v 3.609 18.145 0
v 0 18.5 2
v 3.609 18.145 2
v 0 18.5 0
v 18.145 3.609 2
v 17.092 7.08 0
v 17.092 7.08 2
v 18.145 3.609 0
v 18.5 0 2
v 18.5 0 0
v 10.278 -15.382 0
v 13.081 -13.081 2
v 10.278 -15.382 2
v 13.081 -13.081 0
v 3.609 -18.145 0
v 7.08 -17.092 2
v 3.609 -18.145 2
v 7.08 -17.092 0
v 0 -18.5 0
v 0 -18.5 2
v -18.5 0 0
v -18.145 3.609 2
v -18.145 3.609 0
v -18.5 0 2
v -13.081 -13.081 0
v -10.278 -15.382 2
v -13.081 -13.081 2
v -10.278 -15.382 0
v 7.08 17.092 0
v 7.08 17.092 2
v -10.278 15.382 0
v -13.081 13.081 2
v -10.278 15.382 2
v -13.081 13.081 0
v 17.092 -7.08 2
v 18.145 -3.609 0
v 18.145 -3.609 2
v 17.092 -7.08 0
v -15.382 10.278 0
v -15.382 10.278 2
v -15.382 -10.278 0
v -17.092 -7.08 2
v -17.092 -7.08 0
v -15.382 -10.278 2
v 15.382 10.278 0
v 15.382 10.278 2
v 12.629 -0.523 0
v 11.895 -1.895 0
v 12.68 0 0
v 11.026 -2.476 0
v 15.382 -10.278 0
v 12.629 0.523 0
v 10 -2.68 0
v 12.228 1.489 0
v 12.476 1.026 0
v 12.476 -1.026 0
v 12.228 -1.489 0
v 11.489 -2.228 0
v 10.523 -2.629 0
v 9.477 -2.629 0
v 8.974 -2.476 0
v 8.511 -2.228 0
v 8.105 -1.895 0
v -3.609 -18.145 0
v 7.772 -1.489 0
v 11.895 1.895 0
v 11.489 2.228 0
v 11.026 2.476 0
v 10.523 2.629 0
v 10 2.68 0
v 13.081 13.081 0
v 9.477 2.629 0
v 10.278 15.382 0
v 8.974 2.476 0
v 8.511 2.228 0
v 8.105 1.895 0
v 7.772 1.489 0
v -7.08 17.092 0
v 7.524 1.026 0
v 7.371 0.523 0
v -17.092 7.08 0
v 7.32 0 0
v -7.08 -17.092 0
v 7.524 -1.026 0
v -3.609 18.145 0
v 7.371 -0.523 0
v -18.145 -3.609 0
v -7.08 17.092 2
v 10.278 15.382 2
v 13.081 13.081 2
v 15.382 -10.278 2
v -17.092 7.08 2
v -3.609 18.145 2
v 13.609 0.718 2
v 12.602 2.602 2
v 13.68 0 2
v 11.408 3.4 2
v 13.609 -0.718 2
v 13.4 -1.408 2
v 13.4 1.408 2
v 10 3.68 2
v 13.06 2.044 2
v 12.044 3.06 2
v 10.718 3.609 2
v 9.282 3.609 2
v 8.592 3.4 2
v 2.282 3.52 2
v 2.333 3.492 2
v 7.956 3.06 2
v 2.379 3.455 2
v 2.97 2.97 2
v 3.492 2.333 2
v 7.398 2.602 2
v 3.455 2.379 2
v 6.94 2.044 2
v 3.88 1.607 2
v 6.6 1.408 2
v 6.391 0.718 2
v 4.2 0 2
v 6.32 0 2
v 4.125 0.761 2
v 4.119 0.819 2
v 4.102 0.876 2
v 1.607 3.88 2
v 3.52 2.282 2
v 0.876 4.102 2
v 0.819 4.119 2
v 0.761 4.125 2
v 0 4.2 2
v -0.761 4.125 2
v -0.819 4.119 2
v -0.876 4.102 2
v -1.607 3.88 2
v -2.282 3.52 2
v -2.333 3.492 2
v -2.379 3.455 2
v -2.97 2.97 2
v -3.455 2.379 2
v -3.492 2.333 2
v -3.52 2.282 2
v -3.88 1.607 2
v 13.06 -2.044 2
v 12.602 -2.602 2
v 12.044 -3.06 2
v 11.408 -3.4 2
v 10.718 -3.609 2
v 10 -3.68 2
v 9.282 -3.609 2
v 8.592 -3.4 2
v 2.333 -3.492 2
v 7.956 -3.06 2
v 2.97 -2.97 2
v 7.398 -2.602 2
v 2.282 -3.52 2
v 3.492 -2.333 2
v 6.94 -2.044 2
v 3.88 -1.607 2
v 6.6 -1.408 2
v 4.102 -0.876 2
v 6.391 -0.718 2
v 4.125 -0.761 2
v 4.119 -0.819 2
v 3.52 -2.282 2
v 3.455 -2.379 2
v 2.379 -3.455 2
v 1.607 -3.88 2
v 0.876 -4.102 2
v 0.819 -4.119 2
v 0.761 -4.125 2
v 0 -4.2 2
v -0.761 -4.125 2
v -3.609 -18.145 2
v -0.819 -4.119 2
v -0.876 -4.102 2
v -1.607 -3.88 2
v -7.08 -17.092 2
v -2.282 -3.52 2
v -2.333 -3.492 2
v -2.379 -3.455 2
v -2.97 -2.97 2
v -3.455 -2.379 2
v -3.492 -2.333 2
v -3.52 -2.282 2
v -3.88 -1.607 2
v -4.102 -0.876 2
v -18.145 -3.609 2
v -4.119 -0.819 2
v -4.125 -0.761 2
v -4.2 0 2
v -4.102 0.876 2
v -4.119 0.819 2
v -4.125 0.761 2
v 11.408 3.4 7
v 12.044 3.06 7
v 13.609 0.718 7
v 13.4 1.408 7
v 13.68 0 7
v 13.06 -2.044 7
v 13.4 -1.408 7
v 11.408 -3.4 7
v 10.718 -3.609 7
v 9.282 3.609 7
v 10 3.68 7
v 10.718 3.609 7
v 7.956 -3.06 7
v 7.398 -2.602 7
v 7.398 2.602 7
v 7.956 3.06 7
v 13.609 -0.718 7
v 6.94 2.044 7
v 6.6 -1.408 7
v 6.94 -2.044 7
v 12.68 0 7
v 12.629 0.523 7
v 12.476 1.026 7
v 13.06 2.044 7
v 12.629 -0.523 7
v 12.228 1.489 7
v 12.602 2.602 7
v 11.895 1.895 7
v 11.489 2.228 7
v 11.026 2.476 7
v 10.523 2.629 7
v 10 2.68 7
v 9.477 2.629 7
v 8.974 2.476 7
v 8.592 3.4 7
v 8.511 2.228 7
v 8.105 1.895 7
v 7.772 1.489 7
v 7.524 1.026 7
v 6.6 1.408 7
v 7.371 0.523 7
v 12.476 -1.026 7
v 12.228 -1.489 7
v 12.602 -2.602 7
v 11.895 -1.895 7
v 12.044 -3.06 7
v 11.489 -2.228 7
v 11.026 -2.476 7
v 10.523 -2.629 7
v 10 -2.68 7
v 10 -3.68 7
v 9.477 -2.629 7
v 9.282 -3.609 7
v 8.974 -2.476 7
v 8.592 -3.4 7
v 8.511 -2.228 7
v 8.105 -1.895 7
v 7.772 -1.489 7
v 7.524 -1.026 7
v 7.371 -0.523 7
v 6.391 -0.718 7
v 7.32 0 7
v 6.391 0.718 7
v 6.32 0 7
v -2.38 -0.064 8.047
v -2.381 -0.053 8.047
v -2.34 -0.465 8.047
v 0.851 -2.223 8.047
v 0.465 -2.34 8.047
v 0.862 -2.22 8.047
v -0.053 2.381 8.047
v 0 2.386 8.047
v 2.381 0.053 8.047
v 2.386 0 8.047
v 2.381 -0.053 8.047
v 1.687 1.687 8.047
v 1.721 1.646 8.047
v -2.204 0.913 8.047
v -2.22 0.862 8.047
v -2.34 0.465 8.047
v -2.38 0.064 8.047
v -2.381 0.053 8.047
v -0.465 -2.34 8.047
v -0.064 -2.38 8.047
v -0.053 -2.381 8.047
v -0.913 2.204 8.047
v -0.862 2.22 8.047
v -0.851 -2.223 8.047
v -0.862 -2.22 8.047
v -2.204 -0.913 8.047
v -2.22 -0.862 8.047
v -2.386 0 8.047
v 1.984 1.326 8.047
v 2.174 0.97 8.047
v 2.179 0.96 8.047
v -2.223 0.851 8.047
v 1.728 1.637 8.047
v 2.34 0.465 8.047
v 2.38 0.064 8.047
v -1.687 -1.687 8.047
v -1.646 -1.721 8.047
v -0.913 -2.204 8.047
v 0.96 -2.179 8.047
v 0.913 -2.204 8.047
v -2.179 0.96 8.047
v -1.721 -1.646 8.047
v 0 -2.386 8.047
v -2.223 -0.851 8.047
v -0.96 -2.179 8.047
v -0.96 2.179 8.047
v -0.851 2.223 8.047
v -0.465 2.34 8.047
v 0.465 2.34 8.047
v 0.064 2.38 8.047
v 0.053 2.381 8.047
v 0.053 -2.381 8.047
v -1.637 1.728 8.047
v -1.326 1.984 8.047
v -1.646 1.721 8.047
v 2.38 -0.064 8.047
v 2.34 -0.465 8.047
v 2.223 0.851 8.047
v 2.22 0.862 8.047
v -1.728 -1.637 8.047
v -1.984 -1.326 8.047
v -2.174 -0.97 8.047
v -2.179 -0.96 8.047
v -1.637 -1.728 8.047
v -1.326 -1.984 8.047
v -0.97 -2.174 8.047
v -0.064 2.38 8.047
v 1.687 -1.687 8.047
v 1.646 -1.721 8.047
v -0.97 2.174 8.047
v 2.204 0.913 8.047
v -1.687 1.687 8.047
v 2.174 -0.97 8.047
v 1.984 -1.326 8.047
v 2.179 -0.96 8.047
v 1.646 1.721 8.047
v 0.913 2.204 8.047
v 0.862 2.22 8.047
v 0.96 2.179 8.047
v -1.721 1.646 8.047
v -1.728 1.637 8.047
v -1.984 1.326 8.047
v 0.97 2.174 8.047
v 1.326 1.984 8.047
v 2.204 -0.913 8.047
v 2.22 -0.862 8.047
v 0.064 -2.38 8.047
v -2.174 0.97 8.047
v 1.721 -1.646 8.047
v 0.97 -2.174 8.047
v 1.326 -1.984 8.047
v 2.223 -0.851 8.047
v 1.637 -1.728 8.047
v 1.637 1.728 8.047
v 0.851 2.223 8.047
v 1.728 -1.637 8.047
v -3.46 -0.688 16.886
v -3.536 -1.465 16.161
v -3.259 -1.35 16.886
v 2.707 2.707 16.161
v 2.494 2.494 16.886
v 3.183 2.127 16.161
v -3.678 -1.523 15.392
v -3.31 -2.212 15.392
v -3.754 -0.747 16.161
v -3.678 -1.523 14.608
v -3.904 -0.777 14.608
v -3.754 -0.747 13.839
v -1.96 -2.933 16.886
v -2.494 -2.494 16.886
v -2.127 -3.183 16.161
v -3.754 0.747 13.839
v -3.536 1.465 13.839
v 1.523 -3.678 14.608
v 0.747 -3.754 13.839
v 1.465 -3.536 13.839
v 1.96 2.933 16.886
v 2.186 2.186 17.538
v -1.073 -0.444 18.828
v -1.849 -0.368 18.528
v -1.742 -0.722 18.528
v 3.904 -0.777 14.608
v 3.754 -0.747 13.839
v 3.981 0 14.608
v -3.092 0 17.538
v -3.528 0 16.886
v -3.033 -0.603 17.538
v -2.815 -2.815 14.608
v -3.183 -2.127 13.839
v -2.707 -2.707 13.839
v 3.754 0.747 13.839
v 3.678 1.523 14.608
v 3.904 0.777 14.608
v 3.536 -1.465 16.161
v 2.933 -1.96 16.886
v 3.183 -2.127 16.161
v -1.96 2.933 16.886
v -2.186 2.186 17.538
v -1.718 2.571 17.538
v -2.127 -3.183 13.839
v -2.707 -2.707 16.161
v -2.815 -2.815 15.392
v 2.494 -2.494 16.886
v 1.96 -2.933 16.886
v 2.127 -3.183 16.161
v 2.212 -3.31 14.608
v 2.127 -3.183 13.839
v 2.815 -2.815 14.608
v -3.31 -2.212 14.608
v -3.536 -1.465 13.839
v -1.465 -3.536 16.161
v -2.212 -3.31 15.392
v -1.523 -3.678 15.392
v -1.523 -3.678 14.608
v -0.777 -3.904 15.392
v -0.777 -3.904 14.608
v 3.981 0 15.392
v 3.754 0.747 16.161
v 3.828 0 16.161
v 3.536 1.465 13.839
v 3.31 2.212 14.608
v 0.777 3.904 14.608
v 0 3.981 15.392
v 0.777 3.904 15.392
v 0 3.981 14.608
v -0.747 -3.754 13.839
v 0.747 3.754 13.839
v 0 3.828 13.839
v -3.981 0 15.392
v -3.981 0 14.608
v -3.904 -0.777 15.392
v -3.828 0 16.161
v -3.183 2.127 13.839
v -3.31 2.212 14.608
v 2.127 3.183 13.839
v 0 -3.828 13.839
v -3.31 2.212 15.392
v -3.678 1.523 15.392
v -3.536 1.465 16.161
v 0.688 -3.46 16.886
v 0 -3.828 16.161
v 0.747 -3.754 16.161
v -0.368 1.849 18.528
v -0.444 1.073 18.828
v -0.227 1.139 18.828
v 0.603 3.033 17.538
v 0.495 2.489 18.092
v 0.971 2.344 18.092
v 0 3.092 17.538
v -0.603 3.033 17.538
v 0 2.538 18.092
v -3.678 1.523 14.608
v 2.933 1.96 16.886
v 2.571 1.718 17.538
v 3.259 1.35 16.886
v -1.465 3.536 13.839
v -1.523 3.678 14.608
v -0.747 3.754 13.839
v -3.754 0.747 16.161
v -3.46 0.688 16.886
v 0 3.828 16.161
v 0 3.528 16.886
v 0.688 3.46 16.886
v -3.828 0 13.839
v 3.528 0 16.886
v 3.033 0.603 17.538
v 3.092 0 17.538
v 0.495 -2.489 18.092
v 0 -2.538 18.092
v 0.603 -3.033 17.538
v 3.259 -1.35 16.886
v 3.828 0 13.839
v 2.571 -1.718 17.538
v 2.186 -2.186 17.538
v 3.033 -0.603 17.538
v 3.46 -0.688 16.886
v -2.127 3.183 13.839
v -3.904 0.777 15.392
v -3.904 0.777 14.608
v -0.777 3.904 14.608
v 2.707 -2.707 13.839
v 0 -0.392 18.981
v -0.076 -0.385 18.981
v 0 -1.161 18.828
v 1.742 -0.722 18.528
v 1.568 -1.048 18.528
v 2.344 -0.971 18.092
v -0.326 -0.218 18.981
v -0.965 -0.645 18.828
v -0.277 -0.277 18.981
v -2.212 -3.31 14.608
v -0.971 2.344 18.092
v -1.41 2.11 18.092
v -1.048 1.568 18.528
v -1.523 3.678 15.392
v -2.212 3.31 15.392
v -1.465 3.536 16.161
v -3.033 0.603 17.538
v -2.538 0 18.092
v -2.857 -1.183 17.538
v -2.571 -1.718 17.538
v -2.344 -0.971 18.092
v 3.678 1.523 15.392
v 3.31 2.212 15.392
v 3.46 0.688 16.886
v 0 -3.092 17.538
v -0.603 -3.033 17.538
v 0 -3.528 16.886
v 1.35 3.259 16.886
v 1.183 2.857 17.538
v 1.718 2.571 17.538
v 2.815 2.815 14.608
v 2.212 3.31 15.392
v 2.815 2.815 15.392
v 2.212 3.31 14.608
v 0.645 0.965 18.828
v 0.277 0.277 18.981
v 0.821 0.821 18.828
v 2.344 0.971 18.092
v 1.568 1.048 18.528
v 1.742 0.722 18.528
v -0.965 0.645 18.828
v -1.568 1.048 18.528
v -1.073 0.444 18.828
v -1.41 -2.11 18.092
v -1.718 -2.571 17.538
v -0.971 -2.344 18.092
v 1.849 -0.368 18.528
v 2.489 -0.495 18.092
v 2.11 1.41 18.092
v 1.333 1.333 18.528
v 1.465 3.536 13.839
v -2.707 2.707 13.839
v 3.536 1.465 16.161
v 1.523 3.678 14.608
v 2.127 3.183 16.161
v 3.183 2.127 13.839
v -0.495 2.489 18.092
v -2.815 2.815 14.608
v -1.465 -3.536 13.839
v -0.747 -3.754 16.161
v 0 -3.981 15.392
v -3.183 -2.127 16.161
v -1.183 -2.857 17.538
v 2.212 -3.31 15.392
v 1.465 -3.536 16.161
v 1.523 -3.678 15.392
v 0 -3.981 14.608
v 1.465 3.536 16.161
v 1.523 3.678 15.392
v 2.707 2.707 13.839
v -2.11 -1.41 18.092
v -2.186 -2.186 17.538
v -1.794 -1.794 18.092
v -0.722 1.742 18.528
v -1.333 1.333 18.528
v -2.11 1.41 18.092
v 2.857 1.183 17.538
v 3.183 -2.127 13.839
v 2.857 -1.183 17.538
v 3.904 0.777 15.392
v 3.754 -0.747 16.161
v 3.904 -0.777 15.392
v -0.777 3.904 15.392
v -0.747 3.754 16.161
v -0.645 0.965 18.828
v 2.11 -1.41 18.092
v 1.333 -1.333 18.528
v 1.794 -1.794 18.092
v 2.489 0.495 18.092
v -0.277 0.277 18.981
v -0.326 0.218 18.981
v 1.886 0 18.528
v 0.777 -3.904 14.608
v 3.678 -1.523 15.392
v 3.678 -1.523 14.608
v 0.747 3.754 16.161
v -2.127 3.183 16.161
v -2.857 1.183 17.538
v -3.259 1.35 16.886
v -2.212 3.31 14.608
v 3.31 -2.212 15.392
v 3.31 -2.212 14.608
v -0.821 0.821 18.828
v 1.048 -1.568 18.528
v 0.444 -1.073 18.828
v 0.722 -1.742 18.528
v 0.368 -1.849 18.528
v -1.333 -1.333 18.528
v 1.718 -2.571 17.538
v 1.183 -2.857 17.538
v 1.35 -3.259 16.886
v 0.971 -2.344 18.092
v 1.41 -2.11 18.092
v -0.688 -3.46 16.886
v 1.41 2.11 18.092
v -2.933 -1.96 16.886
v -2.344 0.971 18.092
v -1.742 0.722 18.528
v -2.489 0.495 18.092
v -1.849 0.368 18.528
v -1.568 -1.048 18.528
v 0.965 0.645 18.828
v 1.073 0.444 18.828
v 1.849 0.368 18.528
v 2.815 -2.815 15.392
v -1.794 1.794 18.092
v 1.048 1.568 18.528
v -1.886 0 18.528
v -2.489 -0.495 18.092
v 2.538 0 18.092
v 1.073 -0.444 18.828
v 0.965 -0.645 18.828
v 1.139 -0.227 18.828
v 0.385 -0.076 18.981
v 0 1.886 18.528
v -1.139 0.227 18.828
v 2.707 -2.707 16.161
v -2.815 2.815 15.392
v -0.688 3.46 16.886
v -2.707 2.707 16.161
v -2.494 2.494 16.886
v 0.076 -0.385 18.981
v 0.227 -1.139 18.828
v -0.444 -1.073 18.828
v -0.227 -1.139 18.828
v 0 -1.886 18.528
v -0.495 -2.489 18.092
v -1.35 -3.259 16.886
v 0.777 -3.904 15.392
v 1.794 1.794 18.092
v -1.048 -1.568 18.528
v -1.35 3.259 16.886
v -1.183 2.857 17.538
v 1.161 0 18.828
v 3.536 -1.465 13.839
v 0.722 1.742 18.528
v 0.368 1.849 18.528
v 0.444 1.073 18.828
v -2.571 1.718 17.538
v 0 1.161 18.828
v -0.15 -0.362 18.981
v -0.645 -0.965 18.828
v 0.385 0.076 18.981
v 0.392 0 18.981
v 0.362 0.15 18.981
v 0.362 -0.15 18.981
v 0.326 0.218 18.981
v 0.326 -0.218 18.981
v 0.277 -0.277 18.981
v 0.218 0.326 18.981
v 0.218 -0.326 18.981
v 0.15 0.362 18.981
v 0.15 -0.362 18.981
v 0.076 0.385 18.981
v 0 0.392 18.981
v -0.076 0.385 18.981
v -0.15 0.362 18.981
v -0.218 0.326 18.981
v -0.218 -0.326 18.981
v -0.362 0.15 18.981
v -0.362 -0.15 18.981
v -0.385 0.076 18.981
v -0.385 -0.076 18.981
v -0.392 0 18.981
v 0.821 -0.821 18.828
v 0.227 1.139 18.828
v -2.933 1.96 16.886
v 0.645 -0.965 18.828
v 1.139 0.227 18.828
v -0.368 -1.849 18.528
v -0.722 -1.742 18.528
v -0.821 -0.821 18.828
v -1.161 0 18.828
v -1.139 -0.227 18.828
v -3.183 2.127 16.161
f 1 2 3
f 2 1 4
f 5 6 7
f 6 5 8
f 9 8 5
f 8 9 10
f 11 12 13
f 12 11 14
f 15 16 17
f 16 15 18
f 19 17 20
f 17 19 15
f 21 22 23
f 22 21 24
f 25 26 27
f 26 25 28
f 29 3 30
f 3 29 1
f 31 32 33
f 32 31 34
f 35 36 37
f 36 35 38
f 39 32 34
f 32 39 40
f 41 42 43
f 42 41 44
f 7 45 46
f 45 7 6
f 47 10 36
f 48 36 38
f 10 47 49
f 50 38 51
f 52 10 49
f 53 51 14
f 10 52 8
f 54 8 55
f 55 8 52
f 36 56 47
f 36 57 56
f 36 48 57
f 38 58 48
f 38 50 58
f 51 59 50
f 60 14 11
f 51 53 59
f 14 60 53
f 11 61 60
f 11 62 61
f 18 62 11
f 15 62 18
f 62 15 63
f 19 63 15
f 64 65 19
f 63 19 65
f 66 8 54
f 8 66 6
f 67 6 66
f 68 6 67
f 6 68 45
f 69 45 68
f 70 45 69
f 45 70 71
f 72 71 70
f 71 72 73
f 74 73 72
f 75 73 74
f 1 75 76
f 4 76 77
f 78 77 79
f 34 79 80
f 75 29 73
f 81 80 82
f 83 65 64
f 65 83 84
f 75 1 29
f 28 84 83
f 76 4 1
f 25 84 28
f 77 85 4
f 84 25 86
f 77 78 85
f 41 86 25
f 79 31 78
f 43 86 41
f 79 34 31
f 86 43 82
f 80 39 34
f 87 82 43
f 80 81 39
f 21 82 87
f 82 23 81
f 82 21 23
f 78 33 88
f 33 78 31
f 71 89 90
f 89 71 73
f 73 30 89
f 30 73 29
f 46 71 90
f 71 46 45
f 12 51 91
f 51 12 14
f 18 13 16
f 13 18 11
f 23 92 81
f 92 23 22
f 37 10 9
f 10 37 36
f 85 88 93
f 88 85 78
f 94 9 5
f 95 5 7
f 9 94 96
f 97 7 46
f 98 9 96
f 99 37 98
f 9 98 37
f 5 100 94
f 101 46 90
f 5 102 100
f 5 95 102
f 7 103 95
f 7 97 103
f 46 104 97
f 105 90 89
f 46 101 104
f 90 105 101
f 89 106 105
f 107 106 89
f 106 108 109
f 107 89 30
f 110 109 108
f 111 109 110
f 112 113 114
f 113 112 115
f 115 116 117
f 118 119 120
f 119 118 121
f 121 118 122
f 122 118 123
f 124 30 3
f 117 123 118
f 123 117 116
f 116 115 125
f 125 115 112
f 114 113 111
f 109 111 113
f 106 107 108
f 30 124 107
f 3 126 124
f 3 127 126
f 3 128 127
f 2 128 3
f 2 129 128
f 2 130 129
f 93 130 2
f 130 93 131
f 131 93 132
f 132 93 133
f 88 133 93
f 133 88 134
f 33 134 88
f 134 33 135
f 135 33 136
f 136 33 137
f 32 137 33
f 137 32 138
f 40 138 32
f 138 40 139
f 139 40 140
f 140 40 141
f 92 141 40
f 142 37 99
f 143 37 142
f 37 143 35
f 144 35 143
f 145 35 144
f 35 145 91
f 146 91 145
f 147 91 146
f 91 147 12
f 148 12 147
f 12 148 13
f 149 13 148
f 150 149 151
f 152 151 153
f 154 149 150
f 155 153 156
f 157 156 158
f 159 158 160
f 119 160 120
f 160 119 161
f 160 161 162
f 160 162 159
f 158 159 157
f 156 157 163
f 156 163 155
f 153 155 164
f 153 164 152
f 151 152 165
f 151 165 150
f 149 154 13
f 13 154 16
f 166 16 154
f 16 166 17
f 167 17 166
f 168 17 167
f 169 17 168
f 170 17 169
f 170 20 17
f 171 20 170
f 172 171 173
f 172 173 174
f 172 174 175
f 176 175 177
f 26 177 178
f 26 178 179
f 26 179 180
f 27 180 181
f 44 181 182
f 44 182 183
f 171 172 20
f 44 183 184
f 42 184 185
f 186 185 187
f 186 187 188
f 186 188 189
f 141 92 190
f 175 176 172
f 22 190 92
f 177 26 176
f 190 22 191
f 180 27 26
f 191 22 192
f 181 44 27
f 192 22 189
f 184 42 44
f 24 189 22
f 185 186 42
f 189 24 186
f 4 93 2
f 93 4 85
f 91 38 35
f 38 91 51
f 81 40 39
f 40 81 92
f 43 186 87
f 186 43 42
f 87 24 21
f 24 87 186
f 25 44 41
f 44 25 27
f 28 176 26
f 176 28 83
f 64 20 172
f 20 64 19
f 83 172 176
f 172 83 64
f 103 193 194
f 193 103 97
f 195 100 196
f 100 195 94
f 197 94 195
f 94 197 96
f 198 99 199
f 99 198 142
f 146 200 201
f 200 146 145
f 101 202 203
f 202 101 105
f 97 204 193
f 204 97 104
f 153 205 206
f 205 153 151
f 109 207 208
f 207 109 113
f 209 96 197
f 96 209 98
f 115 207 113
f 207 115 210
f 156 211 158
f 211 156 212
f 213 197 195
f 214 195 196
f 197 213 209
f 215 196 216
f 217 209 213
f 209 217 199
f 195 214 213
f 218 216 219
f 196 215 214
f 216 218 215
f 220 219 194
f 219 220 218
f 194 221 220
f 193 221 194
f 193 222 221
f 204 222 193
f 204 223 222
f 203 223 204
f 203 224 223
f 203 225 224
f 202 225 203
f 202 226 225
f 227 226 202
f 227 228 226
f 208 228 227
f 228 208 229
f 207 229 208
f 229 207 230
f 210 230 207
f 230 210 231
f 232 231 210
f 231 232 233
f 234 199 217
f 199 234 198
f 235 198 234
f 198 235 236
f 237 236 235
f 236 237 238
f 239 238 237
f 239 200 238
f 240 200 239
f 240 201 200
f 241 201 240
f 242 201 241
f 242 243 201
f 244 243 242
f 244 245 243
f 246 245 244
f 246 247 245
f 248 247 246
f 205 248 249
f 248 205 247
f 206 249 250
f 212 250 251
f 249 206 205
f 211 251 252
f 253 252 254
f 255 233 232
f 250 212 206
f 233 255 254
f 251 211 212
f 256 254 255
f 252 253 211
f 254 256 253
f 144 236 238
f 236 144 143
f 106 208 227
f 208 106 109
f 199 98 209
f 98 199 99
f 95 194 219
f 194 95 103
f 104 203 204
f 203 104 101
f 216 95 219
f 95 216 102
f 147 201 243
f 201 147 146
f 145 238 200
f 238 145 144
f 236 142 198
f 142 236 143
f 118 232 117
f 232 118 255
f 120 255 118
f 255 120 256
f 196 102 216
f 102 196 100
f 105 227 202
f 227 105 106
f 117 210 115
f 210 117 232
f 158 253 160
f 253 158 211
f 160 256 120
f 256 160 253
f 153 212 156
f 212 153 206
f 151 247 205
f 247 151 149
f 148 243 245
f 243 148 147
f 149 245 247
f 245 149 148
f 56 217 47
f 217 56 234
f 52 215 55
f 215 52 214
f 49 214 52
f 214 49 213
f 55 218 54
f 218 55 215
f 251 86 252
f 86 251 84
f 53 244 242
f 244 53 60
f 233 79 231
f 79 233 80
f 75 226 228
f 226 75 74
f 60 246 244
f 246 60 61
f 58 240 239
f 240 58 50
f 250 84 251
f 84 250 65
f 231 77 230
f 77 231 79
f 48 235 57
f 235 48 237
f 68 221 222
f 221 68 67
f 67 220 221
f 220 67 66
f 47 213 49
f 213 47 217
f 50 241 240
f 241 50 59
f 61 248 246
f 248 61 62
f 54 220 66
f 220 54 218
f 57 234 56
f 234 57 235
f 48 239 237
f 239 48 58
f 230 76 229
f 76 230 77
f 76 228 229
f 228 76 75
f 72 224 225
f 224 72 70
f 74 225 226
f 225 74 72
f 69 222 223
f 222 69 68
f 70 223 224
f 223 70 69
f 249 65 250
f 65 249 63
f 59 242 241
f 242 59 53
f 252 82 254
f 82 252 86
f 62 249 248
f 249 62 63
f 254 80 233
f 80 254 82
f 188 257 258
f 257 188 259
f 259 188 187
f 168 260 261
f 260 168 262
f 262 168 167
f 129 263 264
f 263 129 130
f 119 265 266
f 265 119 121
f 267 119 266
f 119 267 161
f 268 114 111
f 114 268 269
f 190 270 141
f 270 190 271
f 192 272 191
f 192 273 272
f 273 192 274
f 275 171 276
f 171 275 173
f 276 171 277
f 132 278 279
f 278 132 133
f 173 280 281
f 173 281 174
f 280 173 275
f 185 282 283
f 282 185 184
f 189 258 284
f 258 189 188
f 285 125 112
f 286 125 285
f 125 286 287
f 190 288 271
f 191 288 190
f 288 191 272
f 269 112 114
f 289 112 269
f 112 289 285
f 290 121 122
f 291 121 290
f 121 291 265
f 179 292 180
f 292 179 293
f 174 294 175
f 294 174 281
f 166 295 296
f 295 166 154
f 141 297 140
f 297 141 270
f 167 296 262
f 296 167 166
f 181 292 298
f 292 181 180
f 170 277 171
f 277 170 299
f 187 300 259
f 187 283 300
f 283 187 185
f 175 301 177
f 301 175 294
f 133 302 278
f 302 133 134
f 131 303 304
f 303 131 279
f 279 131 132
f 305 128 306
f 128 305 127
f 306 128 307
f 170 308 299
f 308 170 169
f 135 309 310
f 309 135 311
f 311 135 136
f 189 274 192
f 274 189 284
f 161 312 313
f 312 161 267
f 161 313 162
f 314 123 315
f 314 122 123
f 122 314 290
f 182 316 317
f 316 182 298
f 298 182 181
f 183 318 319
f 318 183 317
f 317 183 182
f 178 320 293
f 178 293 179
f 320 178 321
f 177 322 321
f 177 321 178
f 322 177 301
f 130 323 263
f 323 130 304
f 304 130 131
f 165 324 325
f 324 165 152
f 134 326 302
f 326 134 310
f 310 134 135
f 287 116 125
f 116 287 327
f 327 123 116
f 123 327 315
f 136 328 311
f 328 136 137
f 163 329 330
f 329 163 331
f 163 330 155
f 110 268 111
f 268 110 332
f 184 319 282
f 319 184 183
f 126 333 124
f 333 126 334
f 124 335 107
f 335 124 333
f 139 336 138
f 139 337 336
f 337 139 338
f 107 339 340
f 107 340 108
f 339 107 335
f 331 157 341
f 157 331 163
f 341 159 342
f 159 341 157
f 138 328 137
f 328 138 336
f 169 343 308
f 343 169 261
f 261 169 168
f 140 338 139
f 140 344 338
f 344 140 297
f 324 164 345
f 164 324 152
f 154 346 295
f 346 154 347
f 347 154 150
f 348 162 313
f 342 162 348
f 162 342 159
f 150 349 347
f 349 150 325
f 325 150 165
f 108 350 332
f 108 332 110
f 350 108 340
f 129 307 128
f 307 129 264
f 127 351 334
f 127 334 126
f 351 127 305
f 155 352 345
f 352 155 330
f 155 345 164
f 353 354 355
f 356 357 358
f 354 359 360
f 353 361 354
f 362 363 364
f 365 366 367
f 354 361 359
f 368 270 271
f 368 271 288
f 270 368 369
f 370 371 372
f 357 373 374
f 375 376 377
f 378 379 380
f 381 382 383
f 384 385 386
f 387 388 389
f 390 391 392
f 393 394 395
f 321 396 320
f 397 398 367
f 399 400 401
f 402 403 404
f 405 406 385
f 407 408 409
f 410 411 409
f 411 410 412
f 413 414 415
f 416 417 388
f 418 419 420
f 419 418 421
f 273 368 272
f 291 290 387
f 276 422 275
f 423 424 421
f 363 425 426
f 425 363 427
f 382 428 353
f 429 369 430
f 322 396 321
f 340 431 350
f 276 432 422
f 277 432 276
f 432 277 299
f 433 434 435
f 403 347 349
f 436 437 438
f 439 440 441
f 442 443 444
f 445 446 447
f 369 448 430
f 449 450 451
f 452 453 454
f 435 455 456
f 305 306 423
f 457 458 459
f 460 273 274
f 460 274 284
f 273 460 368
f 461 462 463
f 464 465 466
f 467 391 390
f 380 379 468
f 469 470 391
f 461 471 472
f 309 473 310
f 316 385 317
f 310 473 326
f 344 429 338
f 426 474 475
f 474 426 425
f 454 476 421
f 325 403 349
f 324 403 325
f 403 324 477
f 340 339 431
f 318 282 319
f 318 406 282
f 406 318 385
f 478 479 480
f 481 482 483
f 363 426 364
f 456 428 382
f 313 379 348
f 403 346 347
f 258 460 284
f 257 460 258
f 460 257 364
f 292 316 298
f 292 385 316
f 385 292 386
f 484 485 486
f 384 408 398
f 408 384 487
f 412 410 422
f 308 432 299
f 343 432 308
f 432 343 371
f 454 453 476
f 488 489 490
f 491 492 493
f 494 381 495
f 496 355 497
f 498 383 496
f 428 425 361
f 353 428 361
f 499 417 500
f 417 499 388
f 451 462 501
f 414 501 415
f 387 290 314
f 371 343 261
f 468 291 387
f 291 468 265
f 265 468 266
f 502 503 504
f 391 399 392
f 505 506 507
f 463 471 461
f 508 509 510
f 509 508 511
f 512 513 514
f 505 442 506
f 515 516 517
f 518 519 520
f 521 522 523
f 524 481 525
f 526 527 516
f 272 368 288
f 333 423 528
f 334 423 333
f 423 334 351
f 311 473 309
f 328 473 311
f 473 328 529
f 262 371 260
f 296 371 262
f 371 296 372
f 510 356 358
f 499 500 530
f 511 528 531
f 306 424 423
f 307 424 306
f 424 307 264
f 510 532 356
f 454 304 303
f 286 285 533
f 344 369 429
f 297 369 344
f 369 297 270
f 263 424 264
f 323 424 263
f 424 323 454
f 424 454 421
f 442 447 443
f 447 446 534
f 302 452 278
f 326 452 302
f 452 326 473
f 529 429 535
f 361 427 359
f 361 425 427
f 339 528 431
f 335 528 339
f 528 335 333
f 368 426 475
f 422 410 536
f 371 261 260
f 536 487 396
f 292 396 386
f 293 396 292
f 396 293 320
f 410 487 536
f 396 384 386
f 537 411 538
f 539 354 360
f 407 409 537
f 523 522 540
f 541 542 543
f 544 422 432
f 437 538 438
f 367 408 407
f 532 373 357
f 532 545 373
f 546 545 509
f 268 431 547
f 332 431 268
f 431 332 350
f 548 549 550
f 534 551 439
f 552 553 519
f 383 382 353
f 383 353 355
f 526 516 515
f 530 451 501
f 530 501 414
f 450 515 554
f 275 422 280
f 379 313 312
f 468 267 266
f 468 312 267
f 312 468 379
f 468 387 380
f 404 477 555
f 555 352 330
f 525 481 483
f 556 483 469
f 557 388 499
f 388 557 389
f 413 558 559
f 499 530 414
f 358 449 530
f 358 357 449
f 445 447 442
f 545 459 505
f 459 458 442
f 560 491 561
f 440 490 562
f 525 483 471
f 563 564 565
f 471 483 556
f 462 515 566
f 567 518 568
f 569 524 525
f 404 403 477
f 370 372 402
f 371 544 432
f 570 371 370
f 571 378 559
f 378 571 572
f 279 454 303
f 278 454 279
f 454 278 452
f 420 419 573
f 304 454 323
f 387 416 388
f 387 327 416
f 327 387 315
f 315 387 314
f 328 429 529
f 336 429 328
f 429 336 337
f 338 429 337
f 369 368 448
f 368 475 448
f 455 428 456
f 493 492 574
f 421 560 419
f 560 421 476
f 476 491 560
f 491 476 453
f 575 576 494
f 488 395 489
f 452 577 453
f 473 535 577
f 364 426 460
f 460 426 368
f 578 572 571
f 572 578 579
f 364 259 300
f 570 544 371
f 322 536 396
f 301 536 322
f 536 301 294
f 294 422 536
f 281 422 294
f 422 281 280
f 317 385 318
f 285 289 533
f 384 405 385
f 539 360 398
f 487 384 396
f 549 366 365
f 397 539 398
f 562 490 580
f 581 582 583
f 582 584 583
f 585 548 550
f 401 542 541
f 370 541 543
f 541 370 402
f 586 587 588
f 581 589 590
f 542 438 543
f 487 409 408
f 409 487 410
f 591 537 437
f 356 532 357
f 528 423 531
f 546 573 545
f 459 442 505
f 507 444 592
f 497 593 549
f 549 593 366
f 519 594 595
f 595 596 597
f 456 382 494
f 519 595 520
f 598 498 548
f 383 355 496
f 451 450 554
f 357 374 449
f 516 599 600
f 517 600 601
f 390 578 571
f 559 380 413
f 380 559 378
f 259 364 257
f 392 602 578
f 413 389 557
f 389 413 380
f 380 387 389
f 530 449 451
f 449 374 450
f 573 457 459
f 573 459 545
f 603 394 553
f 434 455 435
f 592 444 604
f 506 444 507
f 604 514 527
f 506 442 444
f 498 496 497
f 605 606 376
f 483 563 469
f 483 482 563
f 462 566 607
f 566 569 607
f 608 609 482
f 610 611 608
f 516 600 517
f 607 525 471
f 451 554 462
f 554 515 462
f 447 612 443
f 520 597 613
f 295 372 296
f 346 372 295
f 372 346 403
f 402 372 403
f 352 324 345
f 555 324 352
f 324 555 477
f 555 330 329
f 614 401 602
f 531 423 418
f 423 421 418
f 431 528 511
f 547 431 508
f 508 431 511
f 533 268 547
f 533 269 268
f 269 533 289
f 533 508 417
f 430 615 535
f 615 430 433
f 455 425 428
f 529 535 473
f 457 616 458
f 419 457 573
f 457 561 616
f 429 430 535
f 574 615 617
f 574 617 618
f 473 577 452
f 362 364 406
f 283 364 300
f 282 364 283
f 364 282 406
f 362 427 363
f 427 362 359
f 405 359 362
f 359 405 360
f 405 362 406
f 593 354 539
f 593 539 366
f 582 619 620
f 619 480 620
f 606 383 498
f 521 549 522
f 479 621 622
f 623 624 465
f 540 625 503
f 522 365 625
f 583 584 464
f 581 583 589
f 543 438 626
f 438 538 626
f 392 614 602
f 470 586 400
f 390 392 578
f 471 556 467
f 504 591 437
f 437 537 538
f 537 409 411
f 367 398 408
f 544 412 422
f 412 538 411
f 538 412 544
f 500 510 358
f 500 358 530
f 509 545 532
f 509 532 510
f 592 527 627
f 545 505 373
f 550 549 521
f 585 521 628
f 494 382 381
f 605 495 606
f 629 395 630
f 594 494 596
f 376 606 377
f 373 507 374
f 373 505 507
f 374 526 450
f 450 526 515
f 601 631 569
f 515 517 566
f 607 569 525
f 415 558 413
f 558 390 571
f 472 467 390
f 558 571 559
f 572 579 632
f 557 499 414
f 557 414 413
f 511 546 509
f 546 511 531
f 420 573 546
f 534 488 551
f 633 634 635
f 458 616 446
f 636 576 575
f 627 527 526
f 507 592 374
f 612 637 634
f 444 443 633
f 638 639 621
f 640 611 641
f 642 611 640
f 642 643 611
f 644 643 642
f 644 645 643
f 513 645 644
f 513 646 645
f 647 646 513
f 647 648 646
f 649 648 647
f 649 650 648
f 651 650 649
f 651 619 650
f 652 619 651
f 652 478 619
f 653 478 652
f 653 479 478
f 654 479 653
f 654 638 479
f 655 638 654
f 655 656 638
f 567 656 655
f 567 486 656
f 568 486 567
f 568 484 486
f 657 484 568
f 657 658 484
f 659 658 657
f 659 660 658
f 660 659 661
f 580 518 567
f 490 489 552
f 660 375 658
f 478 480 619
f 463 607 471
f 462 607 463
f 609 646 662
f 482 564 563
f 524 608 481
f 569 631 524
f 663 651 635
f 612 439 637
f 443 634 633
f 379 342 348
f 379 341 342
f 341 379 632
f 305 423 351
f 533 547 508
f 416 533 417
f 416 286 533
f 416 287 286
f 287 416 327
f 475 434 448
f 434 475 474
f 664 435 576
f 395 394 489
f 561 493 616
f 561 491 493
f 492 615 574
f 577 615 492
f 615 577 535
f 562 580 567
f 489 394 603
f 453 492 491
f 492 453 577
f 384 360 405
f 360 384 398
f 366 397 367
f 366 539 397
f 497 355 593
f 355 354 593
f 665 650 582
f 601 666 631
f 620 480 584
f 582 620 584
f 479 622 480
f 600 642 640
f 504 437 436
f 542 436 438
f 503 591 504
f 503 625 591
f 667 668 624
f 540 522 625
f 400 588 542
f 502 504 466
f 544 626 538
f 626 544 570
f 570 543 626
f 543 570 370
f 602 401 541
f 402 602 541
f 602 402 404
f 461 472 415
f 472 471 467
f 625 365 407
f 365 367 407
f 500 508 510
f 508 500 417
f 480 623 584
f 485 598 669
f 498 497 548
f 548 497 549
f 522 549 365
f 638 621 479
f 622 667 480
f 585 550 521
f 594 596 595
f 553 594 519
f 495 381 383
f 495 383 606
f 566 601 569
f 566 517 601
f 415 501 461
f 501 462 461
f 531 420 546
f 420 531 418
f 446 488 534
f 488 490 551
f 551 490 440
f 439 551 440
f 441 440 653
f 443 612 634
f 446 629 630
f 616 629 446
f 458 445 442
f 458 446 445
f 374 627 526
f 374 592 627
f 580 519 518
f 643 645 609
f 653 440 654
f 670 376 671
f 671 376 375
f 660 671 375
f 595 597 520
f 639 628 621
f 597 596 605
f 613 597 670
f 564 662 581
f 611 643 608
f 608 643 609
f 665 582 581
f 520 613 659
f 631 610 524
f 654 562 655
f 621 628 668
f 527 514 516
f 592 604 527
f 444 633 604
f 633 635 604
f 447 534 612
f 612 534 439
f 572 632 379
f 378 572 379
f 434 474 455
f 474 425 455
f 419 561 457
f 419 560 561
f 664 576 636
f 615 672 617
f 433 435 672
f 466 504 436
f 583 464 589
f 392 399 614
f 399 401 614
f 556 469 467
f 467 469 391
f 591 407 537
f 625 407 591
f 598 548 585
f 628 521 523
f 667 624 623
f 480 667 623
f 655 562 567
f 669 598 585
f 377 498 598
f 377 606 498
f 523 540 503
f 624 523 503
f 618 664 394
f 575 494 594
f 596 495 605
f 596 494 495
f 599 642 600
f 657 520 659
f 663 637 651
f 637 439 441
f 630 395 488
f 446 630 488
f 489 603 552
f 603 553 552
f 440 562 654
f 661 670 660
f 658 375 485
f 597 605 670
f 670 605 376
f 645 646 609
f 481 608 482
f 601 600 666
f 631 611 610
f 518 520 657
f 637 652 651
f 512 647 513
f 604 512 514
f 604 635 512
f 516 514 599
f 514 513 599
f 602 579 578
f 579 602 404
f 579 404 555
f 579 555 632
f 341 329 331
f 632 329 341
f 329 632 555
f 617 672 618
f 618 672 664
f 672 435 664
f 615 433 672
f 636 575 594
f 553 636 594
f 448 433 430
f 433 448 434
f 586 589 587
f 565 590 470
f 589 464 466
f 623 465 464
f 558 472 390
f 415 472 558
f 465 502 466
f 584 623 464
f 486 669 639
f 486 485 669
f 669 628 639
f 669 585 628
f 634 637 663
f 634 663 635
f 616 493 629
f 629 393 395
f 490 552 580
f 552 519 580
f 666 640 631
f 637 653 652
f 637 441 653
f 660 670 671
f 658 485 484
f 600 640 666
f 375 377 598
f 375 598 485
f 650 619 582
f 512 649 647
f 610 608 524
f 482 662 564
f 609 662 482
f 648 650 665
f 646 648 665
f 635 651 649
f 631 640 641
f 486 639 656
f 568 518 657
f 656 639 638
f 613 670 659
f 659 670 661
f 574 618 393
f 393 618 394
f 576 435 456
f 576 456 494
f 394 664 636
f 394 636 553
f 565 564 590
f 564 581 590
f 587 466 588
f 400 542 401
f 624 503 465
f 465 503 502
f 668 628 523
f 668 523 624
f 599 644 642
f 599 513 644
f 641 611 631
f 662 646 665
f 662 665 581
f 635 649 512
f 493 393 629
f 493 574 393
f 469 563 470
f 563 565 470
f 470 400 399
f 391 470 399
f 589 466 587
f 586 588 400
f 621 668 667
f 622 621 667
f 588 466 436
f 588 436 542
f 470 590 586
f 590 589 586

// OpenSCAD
$fn=32;
cover_r=18.5;
hole_r=2.68;
hole_offset=10;
thickness = 2;

hold_h=15;

hull() {
    cylinder(r=4.5);
    translate([0, 0, hold_h/2]) {
        cylinder(r=2.25);
    }
}
hull() {
    translate([0, 0, hold_h/2]) {
        cylinder(r=2.25);
        translate([0, 0, hold_h/2]) {
            sphere(4);
        }
    }
}




difference() {
    union() {
    cylinder(h=thickness, r=cover_r);
        translate([hole_offset, 0, 0]) {
            cylinder(h=7, r=hole_r+1);
        }
    }
    translate([hole_offset, 0, 0]) {
        cylinder(h=thickness, r=hole_r);
        cylinder(h=7, r=hole_r);
    }
}
